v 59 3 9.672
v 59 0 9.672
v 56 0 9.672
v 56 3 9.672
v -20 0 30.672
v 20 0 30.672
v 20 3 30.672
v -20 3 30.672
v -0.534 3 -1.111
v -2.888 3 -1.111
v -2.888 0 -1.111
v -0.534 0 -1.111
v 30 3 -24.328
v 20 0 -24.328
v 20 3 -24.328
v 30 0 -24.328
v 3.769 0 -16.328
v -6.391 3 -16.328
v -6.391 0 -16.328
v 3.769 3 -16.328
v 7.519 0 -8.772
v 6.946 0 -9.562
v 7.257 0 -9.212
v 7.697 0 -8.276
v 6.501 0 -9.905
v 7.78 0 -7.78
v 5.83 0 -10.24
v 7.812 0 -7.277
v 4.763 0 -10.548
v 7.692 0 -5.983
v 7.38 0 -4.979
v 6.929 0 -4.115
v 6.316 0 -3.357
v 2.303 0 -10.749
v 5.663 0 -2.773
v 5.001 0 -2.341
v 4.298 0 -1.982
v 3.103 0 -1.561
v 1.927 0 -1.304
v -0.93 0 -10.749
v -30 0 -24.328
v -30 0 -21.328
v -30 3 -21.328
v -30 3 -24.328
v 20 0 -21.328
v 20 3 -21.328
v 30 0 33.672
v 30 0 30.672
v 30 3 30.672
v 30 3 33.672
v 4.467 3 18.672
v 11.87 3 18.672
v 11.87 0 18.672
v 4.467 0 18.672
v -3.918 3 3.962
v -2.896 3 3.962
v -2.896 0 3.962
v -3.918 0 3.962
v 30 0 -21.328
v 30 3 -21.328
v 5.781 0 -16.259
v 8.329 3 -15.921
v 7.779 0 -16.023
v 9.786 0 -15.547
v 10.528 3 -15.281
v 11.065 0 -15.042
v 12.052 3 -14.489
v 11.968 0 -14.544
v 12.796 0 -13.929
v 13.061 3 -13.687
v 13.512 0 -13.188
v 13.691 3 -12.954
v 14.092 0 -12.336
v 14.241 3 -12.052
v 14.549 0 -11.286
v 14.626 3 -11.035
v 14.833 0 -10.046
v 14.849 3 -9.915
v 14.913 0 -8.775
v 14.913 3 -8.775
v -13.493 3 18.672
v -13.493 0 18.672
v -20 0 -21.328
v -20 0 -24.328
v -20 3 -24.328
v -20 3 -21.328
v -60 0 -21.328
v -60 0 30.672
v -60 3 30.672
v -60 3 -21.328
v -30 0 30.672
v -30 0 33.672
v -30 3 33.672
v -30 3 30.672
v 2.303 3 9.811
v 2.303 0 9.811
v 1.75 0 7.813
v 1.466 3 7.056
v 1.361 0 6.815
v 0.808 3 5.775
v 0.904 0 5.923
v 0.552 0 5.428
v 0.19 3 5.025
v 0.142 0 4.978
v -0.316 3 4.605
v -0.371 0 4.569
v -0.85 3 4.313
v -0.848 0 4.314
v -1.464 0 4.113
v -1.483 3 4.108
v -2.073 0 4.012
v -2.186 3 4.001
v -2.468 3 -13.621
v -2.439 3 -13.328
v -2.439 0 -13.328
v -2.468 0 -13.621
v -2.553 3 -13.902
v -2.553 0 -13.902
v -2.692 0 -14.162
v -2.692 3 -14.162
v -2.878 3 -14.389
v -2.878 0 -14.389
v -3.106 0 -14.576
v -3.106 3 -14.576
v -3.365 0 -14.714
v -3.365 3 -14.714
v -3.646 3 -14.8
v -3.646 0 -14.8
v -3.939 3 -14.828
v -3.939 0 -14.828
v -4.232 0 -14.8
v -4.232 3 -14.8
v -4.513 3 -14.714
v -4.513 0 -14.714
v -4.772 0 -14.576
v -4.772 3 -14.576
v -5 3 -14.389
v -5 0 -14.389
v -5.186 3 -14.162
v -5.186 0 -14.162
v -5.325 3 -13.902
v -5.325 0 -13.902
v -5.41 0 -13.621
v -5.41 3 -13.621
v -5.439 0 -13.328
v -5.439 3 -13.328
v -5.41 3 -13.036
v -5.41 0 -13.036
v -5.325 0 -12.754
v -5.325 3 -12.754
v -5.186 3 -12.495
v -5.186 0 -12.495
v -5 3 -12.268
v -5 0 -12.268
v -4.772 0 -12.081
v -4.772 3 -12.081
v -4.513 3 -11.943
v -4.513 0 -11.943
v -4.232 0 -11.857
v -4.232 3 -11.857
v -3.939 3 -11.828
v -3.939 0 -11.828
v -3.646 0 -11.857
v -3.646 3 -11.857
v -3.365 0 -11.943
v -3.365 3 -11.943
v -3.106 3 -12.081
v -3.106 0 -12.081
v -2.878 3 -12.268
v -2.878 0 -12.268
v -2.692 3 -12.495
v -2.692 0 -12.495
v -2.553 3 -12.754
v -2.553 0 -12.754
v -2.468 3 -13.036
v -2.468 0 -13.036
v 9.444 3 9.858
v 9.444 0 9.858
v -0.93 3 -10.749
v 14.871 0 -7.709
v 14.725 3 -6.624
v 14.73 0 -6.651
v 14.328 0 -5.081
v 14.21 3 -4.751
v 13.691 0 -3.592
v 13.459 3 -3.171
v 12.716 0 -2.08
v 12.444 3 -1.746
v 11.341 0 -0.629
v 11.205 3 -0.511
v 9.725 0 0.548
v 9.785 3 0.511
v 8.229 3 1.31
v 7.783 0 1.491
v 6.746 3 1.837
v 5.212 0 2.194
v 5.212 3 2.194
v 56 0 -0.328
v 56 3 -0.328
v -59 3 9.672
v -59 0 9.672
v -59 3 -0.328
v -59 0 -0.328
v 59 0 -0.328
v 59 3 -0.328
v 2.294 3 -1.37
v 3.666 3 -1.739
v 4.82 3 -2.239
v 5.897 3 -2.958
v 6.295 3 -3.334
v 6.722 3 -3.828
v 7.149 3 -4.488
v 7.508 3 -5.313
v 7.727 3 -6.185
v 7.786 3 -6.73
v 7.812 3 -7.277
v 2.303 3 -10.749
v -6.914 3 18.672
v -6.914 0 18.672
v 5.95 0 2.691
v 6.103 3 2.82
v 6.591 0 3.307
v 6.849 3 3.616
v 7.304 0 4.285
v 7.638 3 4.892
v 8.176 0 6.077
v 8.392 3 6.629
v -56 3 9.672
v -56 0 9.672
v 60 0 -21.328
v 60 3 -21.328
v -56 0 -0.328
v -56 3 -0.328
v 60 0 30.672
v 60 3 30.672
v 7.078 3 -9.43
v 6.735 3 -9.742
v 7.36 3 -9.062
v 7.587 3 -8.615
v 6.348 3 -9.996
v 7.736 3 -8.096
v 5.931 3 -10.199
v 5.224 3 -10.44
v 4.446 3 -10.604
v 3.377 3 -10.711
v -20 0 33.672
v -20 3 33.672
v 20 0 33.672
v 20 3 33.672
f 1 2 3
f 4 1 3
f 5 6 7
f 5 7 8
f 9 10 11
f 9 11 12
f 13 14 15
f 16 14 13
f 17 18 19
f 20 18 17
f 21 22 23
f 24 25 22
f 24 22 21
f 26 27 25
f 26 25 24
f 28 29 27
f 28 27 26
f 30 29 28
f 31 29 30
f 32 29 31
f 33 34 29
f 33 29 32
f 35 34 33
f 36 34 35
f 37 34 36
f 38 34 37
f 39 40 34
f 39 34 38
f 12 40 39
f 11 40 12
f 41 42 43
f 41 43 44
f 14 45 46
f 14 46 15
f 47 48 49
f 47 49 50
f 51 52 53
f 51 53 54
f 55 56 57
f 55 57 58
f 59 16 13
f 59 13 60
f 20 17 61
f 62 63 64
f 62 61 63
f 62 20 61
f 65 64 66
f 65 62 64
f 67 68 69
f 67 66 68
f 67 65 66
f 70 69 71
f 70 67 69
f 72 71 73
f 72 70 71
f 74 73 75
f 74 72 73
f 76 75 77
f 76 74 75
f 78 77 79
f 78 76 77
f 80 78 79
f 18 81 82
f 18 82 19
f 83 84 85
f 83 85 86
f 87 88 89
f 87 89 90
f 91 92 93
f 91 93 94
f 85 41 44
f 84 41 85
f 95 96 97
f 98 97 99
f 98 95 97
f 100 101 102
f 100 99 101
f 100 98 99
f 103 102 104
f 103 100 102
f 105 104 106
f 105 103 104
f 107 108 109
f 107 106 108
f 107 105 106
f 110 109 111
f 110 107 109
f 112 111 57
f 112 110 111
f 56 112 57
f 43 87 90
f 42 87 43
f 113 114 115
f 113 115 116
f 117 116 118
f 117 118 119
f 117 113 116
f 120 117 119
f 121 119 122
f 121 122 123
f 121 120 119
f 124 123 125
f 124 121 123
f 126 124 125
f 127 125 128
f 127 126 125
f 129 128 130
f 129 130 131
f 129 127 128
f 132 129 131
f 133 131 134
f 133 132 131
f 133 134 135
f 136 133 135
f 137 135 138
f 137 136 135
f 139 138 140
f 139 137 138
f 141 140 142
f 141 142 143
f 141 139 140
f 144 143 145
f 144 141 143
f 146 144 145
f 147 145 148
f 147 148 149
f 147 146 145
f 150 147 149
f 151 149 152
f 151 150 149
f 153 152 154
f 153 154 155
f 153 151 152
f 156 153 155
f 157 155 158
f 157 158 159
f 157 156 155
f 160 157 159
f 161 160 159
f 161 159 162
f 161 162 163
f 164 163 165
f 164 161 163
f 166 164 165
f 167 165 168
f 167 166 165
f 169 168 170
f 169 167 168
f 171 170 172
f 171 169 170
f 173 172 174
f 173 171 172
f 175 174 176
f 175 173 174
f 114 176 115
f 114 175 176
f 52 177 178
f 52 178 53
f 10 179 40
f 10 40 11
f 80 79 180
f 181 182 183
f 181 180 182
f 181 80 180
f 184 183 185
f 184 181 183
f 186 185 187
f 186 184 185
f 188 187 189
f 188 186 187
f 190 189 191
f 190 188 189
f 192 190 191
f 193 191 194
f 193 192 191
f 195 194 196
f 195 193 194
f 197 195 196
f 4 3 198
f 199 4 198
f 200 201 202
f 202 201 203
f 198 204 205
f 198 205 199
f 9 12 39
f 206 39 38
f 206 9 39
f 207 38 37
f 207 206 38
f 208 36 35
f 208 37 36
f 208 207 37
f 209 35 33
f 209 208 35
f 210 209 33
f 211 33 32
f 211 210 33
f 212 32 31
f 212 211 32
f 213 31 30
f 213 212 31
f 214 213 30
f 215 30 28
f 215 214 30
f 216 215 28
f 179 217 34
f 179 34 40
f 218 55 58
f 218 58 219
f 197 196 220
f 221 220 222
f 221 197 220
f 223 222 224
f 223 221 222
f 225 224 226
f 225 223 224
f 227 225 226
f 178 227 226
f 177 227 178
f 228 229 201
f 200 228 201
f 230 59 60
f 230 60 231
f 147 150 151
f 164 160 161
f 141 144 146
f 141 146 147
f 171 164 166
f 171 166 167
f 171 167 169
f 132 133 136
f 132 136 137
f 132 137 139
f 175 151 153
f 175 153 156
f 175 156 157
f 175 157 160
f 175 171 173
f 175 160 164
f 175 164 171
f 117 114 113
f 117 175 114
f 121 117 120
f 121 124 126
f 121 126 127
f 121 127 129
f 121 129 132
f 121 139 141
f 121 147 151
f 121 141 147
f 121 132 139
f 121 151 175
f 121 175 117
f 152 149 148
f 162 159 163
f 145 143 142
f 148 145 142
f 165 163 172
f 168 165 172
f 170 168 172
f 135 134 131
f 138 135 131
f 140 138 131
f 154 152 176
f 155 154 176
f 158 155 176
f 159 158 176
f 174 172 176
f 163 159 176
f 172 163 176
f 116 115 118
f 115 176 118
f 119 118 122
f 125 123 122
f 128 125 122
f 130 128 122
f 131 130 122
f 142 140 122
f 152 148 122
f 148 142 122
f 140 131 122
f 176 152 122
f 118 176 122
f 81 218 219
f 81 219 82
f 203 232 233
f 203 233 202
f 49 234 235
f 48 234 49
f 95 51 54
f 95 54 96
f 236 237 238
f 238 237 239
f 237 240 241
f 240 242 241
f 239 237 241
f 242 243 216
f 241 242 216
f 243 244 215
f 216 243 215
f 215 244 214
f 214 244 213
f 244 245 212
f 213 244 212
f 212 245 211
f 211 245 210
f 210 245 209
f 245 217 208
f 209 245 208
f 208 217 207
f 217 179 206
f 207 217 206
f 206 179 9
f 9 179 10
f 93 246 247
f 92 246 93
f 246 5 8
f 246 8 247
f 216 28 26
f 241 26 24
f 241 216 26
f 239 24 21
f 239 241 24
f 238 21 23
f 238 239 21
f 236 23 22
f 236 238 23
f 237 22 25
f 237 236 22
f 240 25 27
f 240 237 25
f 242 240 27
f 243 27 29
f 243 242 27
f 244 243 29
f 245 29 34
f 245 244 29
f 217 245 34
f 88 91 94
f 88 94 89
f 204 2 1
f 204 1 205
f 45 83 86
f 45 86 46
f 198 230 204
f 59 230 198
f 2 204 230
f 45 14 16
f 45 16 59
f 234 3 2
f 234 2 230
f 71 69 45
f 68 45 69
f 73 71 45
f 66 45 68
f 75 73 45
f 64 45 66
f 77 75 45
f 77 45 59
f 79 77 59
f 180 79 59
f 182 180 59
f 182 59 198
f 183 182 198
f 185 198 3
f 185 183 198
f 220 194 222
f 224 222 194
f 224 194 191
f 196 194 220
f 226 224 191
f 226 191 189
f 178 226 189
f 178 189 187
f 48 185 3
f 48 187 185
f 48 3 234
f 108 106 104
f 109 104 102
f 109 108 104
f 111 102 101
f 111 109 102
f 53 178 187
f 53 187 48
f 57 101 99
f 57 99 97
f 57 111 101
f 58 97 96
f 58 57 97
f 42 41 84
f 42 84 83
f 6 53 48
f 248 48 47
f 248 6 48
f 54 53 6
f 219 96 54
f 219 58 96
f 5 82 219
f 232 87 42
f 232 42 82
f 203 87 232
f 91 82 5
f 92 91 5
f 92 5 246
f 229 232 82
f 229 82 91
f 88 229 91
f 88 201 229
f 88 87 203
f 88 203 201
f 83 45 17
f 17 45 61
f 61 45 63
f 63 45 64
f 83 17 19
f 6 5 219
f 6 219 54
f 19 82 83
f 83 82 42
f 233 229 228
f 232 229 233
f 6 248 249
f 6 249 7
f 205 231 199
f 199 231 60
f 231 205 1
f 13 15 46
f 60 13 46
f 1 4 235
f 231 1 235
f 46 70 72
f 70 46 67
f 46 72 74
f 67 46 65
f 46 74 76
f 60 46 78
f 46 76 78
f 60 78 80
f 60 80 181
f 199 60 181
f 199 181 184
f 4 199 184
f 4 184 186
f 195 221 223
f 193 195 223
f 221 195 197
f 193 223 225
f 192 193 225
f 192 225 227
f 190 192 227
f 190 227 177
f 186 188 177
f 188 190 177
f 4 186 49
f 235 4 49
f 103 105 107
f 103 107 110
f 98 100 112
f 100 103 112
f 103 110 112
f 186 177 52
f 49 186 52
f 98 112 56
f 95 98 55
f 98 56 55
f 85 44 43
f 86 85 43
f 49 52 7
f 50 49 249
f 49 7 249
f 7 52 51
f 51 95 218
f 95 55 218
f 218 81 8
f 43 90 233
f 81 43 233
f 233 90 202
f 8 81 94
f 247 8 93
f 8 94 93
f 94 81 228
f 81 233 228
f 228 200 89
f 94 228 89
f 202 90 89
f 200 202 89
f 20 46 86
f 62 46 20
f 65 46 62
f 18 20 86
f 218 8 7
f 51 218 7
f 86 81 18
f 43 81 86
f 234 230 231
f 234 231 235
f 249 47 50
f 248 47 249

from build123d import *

# Parameters (mm, degrees)
SKETCH1_W             = 10
SKETCH1_H             = 3
BOSS_EXTRUDE1_DEPTH   = 3
BODY_MOVE_COPY1_ANGLE = 90
CUT_EXTRUDE1_DEPTH    = 10
SKETCH5_R             = 1.5
BOSS_EXTRUDE2_DEPTH   = 3


with BuildPart() as part:
    # Sketch1 → Boss-Extrude1 (new body)
    with BuildSketch(Plane(origin=(0, 0, 0), x_dir=(1, 0, 0), z_dir=(0, 1, 0))):
        Polygon((-26, 60), (26, 60), (26, 30), (29, 30), (29, 20), (26, 20), (26, -20), (29, -20), (29, -30), (26, -30), (26, -60), (-26, -60), (-26, -30), (-29, -30), (-29, -20), (-26, -20), (-26, 20), (-29, 20), (-29, 30), (-26, 30), align=None)
        with Locations((0, 57.5)):
            Rectangle(SKETCH1_W, SKETCH1_H, mode=Mode.SUBTRACT)
        with Locations((0, -57.5)):
            Rectangle(SKETCH1_W, SKETCH1_H, mode=Mode.SUBTRACT)
    extrude(amount=BOSS_EXTRUDE1_DEPTH)


with BuildPart() as part_1:
    # Body-Move/Copy1: moved
    add(part.part.rotate(Axis((2.335824912, 0, 2.335824912), (0, 1, 0)), BODY_MOVE_COPY1_ANGLE))

    # Sketch3 → Cut-Extrude1 (cut)
    with BuildSketch(Plane(origin=(0, 3, 0), x_dir=(1, 0, 0), z_dir=(0, 1, 0))):
        with BuildLine():
            Line((4.466938406, -18.671649823), (2.30321558, -9.810689678))
            add(Edge.make_bspline(
                [(2.30321558, -9.810689678), (2.237575072, -9.527203361), (2.112322927, -8.986268034), (1.884560825, -8.221822452), (1.661058011, -7.531047935), (1.413133081, -6.918626032), (1.157295895, -6.373259853), (0.894743907, -5.8869704), (0.595714484, -5.47180495), (0.194869077, -5.00534387), (-0.35624983, -4.53279488), (-1.130467052, -4.171954214), (-1.987113549, -3.997311886), (-2.583582774, -3.973814602), (-2.896059783, -3.961504895)],
                knots=[0, 0, 0, 0, 0.00087273, 0.001665302, 0.002392139, 0.003050022, 0.003645666, 0.004199163, 0.004704983, 0.005176946, 0.006043573, 0.006858998, 0.007710931, 0.008648313, 0.008648313, 0.008648313, 0.008648313], degree=3))
            Line((-2.896059783, -3.961504895), (-3.918478261, -3.961504895))
            Line((-3.918478261, -3.961504895), (-6.914402174, -18.671649823))
            Line((-6.914402174, -18.671649823), (-13.492753623, -18.671649823))
            Line((-13.492753623, -18.671649823), (-6.391304348, 16.328350177))
            Line((-6.391304348, 16.328350177), (3.769474638, 16.328350177))
            add(Edge.make_bspline(
                [(3.769474638, 16.328350177), (4.179114658, 16.324666316), (4.983349625, 16.317433894), (6.157480568, 16.235094411), (7.276899975, 16.110679294), (8.333759624, 15.931675368), (9.326691627, 15.693744473), (10.253459532, 15.406039359), (11.100069006, 15.038863675), (11.876823255, 14.621025917), (12.570210089, 14.133703622), (13.189907339, 13.589154481), (13.705367007, 12.959487705), (14.149571746, 12.275556031), (14.492611839, 11.511094404), (14.736787252, 10.668501563), (14.889995303, 9.747634617), (14.905202054, 9.105997443), (14.913043478, 8.775134597)],
                knots=[0, 0, 0, 0, 0.001228717, 0.002412307, 0.003529131, 0.004606709, 0.005625558, 0.006590578, 0.007513678, 0.008389749, 0.009231892, 0.010051352, 0.010856077, 0.011665161, 0.012491643, 0.013359356, 0.014290991, 0.015282848, 0.015282848, 0.015282848, 0.015282848], degree=3))
            add(Edge.make_bspline(
                [(14.913043478, 8.775134597), (14.90634048, 8.431261664), (14.893093398, 7.751668308), (14.760533036, 6.752319412), (14.555714135, 5.783564983), (14.26379236, 4.851946617), (13.888546868, 3.962405889), (13.443769752, 3.112441971), (12.911937837, 2.31580861), (12.30828054, 1.56624831), (11.631026441, 0.880423971), (10.901354362, 0.237517458), (10.094211296, -0.329736345), (9.23357218, -0.847429864), (8.305914573, -1.290927772), (7.327068955, -1.672081546), (6.288772428, -1.973702446), (5.57504277, -2.119764224), (5.211956522, -2.194068301)],
                knots=[0, 0, 0, 0, 0.001031106, 0.002037767, 0.003018669, 0.003998803, 0.004961477, 0.005911638, 0.006872255, 0.007830317, 0.008794328, 0.009760616, 0.010743694, 0.011749543, 0.012770455, 0.013824308, 0.014897768, 0.016009321, 0.016009321, 0.016009321, 0.016009321], degree=3))
            add(Edge.make_bspline(
                [(5.211956522, -2.194068301), (5.433677531, -2.329804407), (5.880826084, -2.603545735), (6.475860944, -3.157094687), (7.036852477, -3.827260458), (7.537100256, -4.668039178), (8.024074361, -5.674016505), (8.492355162, -6.873119692), (8.982550395, -8.283837505), (9.282680049, -9.30719032), (9.444293478, -9.858244026)],
                knots=[0, 0, 0, 0, 0.000778175, 0.00156936, 0.002424824, 0.003392672, 0.00449506, 0.0057755, 0.007251835, 0.008974345, 0.008974345, 0.008974345, 0.008974345], degree=3))
            Line((9.444293478, -9.858244026), (11.869565217, -18.671649823))
            Line((11.869565217, -18.671649823), (4.466938406, -18.671649823))
        make_face()
        with BuildLine():
            add(Edge.make_bspline(
                [(-0.534193841, 1.110958873), (-0.222271666, 1.114684086), (0.389426144, 1.12198945), (1.281419848, 1.203583832), (2.128065934, 1.33111856), (2.927947458, 1.499014183), (3.671997626, 1.734316476), (4.367486912, 1.995689795), (4.994203786, 2.327367466), (5.569374986, 2.688845671), (6.084812921, 3.102569872), (6.522516374, 3.575867415), (6.924121554, 4.074680151), (7.236379669, 4.635434575), (7.492492322, 5.235319597), (7.687442147, 5.876972177), (7.785143439, 6.566165217), (7.80264105, 7.036508201), (7.811594203, 7.277172641)],
                knots=[0, 0, 0, 0, 0.000935538, 0.001834645, 0.002684288, 0.003503557, 0.004283224, 0.005023548, 0.005728982, 0.006406156, 0.007059728, 0.007704446, 0.008337016, 0.008976008, 0.009622283, 0.010291854, 0.01098121, 0.011703539, 0.011703539, 0.011703539, 0.011703539], degree=3))
            add(Edge.make_bspline(
                [(7.811594203, 7.277172641), (7.798872985, 7.559208481), (7.774665424, 8.095902346), (7.523719172, 8.842936343), (7.094837748, 9.463606351), (6.487583788, 9.952170757), (5.703546602, 10.314133032), (4.741260196, 10.580707514), (3.583042546, 10.716731558), (2.749991851, 10.737501066), (2.30321558, 10.748640032)],
                knots=[0, 0, 0, 0, 0.000843857, 0.001605799, 0.002329127, 0.003078056, 0.003914624, 0.004903149, 0.006062203, 0.007402799, 0.007402799, 0.007402799, 0.007402799], degree=3))
            Line((2.30321558, 10.748640032), (-0.930480072, 10.748640032))
            Line((-0.930480072, 10.748640032), (-2.888134058, 1.110958873))
            Line((-2.888134058, 1.110958873), (-0.534193841, 1.110958873))
        make_face(mode=Mode.SUBTRACT)
    extrude(amount=-CUT_EXTRUDE1_DEPTH, mode=Mode.SUBTRACT)


with BuildPart() as body_2:
    # Sketch5 → Boss-Extrude2 (new body)
    with BuildSketch(Plane(origin=(0, 3, 0), x_dir=(1, 0, 0), z_dir=(0, 1, 0))):
        with Locations((-3.938871058, 13.328350177)):
            Circle(SKETCH5_R)
    extrude(amount=-BOSS_EXTRUDE2_DEPTH)


solid = Compound([part_1.part, body_2.part])
